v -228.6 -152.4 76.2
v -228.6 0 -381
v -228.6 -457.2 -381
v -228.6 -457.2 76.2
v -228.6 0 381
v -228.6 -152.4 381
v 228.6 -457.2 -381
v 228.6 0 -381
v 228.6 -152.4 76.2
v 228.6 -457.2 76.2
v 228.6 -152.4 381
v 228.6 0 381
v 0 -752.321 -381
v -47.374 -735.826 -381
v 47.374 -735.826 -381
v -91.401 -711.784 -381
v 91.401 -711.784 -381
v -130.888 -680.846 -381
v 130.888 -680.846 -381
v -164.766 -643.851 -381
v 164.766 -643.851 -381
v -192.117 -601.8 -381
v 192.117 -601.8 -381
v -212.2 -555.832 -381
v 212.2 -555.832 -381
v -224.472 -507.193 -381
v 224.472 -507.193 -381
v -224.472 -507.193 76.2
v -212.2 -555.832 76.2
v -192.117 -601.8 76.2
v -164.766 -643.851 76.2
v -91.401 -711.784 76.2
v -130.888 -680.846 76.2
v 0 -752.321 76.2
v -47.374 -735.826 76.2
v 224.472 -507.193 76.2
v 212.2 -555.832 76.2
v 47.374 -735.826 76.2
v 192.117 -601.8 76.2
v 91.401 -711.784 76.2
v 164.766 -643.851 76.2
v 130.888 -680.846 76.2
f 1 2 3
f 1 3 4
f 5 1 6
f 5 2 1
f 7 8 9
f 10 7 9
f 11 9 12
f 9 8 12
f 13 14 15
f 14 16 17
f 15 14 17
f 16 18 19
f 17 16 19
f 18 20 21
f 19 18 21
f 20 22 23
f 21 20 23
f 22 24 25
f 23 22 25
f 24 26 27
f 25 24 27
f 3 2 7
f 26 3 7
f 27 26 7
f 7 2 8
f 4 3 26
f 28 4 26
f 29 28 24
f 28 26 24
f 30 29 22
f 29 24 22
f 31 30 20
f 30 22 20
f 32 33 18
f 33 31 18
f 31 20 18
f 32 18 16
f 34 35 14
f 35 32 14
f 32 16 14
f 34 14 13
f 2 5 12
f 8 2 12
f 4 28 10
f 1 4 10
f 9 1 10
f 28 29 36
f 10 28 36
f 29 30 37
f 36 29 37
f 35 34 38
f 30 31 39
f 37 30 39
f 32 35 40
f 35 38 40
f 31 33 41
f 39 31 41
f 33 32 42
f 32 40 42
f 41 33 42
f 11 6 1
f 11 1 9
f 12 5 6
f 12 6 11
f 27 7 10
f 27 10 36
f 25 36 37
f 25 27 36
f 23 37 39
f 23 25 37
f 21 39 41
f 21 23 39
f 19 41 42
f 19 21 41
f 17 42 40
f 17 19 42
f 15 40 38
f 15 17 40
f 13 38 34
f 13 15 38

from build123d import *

# Parameters (mm, degrees)
F0_W        = 457.2
F0_H        = 762
F1_DEPTH    = 762
F2_W        = 457.2
F2_H        = 304.8
F3_DEPTH    = 609.6
F4_T1_DEPTH = 1981.2


# Not quite as in the source:
# - a fillet or chamfer that OpenCascade refuses, or shapes differently, is made with other operations: its cross-section is extruded or revolved along the edge and cut away or added


with BuildPart() as f1:
    # F0 (on Front) → F1 (new body)
    with BuildSketch(Plane.XZ):
        Rectangle(F0_W, F0_H)
    extrude(amount=F1_DEPTH)

    # F2 (on face) → F3 (cut)
    with BuildSketch(Plane.XZ.offset(762)):
        with Locations((0, 228.6)):
            Rectangle(F2_W, F2_H)
    extrude(amount=-F3_DEPTH, mode=Mode.SUBTRACT)

    # F4: fillet of radius 304.8 on 2 edges, made by hand

    # F4_s2 → F4_t1 (cut)
    with BuildSketch(Plane.XY.offset(-1143)):
        with BuildLine():
            ThreePointArc((-228.6, -457.2), (-139.3261469057, -672.7261469057), (76.2, -762))
            Line((76.2, -762), (-228.6, -762))
            Line((-228.6, -762), (-228.6, -457.2))
        make_face()
        with BuildLine():
            ThreePointArc((228.6, -457.2), (139.3261469057, -672.7261469057), (-76.2, -762))
            Line((-76.2, -762), (228.6, -762))
            Line((228.6, -762), (228.6, -457.2))
        make_face()
    extrude(amount=F4_T1_DEPTH, mode=Mode.SUBTRACT)


solid = f1.part
